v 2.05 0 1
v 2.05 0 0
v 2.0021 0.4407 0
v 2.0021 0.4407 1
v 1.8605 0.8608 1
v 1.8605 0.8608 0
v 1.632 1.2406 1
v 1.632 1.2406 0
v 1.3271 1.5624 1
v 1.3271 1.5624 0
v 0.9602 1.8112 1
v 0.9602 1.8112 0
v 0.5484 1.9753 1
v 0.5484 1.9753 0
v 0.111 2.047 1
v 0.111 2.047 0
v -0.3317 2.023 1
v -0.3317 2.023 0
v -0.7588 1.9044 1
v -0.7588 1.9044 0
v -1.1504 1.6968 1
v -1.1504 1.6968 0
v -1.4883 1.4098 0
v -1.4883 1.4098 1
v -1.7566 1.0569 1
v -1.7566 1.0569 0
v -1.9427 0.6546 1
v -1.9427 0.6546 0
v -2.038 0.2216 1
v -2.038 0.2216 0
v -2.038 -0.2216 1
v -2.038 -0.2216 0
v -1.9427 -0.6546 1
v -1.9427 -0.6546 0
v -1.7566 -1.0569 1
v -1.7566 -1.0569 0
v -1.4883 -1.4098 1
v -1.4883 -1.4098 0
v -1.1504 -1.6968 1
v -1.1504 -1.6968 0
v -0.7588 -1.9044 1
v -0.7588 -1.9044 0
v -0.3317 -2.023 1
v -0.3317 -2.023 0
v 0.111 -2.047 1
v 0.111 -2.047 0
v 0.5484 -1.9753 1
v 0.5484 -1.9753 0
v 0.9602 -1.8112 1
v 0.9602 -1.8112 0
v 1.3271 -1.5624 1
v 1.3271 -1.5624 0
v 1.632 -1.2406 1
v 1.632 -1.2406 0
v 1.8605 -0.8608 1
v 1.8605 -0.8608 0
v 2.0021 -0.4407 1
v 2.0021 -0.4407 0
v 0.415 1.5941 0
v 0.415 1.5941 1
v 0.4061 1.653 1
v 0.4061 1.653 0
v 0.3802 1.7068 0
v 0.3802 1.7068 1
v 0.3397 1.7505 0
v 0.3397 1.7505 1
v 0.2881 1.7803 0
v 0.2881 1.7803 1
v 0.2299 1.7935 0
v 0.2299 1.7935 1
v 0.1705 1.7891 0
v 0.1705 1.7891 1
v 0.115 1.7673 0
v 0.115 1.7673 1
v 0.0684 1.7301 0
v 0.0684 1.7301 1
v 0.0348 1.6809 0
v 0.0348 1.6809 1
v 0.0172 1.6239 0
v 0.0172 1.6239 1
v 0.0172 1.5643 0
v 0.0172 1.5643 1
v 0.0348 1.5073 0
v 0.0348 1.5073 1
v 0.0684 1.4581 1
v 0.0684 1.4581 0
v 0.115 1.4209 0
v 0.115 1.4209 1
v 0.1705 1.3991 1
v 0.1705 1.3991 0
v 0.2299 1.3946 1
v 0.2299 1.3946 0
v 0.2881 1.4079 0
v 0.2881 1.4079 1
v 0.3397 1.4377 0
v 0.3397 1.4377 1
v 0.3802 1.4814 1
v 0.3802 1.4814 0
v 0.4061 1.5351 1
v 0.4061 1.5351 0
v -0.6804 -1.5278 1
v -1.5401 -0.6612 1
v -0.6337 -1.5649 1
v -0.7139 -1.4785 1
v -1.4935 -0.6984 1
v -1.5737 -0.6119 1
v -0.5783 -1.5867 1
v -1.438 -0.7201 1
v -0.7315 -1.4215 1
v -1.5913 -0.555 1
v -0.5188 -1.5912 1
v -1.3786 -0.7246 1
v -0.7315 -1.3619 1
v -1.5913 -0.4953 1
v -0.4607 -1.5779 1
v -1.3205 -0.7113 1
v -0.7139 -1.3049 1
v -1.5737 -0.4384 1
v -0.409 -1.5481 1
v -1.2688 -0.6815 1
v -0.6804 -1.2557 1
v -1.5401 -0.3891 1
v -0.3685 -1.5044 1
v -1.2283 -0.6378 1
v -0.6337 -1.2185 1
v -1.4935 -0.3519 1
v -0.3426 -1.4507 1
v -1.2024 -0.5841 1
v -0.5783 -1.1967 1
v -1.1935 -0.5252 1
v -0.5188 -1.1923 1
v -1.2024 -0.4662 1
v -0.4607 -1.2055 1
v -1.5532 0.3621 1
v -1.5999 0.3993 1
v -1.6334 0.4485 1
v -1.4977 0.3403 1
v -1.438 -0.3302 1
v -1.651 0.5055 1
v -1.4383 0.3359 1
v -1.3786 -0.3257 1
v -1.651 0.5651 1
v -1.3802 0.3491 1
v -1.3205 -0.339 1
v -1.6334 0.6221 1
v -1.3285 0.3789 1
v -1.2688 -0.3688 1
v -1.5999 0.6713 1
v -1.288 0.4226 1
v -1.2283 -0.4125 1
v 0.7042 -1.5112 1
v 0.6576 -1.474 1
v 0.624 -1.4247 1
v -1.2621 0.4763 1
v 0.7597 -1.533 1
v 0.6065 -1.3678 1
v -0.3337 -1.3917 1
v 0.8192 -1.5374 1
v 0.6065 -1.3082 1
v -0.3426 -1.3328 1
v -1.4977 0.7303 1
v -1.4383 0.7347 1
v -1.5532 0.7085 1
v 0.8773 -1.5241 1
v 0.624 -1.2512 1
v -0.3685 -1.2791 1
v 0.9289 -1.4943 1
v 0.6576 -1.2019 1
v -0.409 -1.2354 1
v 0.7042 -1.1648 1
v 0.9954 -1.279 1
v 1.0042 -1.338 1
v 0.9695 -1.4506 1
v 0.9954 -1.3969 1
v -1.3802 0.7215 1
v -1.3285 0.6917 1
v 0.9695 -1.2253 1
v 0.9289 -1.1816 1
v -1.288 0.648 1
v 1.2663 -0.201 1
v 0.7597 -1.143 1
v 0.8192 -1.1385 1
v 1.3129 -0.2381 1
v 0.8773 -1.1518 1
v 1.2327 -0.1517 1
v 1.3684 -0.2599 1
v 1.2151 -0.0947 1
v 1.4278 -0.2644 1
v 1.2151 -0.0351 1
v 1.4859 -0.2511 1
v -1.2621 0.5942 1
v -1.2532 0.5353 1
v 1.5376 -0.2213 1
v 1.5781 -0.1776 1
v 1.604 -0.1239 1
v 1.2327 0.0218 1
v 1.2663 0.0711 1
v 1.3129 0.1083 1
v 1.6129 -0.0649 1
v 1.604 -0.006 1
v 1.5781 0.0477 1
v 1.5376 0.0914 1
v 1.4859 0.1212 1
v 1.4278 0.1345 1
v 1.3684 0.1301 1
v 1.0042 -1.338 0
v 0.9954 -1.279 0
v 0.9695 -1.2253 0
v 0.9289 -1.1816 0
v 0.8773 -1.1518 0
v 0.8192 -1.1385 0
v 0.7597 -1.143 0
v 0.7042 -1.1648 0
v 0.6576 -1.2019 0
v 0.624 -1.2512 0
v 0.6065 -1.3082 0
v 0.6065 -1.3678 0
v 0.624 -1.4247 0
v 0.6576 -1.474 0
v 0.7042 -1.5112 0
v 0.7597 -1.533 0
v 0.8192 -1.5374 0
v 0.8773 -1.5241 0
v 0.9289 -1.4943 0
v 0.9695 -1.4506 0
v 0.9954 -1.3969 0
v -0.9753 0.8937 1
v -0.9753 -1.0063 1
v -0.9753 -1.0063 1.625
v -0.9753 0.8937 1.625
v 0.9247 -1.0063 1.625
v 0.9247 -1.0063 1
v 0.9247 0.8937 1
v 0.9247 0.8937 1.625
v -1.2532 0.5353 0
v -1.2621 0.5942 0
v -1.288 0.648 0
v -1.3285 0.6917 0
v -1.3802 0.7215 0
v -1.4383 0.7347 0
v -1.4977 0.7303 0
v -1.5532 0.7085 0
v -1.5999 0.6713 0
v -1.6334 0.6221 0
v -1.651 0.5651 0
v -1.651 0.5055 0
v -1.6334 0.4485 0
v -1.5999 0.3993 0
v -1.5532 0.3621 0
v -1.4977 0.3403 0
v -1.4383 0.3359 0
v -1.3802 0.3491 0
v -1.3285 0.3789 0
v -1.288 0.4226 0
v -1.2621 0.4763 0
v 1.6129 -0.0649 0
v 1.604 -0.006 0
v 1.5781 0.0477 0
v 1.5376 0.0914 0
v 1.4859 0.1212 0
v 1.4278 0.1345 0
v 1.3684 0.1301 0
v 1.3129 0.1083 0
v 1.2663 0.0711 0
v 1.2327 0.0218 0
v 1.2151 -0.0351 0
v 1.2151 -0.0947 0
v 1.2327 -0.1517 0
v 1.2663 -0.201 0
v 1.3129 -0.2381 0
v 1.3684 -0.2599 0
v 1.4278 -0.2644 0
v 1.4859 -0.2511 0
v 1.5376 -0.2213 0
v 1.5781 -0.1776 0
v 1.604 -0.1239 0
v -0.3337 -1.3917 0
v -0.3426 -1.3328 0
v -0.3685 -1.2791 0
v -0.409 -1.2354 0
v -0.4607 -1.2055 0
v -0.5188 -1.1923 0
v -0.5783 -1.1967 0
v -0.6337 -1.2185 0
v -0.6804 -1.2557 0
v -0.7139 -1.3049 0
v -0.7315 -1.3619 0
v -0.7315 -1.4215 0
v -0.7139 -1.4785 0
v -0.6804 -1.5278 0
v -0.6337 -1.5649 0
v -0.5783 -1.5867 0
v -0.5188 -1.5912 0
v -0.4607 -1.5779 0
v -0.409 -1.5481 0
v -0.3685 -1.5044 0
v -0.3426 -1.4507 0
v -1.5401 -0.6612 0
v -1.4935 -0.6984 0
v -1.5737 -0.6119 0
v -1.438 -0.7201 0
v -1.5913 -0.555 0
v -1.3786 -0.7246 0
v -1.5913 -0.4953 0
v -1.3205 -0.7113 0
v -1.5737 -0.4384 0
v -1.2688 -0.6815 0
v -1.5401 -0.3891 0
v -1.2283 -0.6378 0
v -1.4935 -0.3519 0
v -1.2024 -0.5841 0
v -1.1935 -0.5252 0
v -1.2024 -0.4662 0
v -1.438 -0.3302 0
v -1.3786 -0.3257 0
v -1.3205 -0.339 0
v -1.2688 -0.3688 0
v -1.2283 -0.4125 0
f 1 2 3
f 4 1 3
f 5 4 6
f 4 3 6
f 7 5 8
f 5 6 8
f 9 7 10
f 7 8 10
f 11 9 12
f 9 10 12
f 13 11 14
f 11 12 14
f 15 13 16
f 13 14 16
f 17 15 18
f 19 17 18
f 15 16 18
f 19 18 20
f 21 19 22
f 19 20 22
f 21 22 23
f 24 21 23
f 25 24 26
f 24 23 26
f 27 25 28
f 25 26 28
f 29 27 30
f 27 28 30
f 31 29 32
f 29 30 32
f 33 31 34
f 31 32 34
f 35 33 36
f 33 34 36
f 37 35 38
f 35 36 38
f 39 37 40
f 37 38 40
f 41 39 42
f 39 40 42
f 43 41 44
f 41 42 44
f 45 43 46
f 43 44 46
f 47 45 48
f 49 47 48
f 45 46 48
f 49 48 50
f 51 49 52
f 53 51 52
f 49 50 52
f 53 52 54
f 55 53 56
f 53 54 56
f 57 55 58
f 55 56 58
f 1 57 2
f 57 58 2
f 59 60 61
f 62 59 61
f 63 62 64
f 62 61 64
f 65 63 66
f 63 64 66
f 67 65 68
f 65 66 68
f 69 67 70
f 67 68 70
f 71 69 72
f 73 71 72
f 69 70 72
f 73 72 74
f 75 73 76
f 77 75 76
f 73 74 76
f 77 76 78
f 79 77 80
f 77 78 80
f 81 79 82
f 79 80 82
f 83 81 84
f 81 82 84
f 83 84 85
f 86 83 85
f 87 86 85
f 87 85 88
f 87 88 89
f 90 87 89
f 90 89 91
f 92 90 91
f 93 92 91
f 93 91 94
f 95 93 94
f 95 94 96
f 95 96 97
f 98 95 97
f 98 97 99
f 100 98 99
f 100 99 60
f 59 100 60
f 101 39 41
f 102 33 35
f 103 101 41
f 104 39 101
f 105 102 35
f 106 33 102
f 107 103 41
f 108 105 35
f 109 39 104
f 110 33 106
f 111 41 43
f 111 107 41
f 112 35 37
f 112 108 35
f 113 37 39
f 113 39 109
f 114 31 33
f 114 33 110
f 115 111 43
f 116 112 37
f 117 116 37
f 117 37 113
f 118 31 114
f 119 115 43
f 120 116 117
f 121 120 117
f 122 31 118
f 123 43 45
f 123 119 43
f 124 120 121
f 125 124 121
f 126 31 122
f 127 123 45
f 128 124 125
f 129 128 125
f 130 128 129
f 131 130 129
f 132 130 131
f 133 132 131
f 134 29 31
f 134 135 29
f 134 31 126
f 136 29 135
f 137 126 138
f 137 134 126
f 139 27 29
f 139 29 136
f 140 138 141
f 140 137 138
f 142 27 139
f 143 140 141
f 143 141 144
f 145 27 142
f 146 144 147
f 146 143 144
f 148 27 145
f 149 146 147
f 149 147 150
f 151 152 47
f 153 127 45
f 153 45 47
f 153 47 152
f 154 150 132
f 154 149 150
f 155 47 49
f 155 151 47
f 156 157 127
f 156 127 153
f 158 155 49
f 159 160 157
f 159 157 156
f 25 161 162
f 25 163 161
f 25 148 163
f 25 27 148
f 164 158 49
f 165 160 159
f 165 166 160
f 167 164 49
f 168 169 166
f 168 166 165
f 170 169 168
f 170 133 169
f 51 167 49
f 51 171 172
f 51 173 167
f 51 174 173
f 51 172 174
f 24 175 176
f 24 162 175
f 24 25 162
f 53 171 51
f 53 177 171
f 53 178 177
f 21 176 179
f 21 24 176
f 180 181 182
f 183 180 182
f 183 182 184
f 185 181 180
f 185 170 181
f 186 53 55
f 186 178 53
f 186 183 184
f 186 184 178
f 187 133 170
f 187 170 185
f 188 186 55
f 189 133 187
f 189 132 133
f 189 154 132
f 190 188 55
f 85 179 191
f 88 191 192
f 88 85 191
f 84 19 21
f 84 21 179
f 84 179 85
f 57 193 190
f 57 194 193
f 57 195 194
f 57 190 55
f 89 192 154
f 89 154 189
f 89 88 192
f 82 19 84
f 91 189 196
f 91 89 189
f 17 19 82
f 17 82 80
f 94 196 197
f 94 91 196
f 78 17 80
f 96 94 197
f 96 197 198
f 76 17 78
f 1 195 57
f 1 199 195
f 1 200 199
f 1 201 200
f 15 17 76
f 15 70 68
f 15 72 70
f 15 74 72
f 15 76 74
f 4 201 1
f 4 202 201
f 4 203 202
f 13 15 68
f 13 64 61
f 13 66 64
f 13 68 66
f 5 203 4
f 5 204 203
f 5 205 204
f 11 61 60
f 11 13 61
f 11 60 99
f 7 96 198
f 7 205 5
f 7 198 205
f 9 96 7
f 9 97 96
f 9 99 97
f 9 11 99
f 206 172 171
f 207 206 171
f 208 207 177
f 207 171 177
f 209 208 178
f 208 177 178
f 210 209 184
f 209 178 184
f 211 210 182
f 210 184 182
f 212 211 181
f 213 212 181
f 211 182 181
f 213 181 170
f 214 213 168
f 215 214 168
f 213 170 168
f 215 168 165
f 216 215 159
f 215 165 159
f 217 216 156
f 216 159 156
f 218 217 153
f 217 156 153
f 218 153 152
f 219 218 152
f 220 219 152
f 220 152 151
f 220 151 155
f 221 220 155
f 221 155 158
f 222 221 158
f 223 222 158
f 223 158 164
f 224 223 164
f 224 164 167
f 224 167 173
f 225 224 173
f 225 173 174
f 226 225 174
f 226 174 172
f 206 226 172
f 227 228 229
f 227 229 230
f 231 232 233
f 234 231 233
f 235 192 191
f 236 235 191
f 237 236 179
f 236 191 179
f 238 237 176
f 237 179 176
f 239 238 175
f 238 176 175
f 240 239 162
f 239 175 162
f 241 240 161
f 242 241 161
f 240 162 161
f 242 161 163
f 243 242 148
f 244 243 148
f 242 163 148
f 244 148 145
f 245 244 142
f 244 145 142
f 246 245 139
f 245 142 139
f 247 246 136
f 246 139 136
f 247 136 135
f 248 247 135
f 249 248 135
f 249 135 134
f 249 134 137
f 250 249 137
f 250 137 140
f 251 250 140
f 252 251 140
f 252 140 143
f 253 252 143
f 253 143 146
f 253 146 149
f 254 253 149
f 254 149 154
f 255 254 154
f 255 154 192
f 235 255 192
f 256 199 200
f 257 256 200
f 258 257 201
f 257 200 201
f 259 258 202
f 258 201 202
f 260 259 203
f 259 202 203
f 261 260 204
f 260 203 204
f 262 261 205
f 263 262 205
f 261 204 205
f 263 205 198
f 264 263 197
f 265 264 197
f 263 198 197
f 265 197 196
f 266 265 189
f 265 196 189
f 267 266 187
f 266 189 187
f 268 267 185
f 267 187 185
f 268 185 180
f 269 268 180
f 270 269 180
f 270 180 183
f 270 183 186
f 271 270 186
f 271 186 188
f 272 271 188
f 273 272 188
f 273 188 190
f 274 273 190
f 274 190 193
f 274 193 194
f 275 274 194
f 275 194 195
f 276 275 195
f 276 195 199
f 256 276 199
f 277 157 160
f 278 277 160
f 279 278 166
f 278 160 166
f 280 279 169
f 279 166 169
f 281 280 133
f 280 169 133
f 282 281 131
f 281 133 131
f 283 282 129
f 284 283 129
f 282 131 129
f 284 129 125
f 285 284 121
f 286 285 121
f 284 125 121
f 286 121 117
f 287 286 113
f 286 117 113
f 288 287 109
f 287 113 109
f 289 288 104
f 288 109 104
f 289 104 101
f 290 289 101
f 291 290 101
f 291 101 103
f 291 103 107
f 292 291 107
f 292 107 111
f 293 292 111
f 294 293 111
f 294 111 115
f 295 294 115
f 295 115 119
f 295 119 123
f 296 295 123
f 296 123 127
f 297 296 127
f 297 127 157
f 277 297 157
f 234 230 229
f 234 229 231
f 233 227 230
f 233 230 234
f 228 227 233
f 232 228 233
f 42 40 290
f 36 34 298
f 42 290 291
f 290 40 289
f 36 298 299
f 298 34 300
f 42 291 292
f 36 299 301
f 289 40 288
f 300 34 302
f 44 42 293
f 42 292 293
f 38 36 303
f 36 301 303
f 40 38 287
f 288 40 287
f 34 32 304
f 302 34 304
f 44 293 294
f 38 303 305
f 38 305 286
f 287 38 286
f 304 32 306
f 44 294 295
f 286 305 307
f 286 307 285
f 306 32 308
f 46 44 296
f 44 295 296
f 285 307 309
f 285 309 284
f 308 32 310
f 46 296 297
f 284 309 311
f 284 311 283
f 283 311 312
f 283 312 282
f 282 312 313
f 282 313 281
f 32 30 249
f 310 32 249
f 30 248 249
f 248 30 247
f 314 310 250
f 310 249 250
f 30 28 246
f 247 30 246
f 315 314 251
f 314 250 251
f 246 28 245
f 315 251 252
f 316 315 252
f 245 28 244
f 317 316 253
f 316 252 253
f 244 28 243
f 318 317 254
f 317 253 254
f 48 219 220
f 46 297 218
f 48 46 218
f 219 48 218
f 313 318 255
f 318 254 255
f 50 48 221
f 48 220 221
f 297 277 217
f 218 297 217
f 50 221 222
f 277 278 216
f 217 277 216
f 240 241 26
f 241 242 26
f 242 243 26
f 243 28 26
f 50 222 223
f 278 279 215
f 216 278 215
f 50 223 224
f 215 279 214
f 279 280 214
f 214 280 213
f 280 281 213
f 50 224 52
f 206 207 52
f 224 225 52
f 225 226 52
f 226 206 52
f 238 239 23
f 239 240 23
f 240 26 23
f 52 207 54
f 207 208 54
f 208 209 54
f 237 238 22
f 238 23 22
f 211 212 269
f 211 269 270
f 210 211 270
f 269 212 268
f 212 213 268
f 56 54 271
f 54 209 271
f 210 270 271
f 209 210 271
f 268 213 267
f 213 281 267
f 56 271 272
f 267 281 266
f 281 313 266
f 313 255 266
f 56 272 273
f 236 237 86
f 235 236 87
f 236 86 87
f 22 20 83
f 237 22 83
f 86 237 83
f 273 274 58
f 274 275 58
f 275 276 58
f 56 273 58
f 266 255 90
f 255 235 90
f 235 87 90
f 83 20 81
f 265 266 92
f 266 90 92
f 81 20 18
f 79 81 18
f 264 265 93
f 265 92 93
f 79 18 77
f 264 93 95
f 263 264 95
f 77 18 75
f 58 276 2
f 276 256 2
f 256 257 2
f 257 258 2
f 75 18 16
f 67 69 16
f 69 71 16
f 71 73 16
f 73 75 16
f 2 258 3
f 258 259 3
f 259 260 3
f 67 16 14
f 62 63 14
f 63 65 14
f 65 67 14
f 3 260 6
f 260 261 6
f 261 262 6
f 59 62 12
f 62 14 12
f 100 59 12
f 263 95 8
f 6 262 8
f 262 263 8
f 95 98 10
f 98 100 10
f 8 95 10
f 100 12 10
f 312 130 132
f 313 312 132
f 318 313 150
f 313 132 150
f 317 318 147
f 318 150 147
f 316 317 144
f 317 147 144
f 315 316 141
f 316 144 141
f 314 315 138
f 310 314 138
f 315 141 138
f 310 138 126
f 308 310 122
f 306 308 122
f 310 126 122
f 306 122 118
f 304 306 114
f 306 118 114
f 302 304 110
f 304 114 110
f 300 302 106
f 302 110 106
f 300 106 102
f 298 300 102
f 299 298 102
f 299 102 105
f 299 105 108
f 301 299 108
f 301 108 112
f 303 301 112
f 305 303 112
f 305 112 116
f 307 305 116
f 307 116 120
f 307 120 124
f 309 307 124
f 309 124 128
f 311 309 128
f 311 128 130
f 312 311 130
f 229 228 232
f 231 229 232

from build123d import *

# Parameters (mm, degrees)
F0_R     = 2.05
F1_DEPTH = 1
F2_W     = 1.9
F2_H     = 1.9
F3_DEPTH = 0.625
F4_R     = 0.2
F5_DEPTH = 1.001


# Not quite as in the source:
# - a feature of the source that left no trace in its solid (it failed there, or was rolled back) is left out


with BuildPart() as f1:
    # F0 (on Top) → F1 (new body)
    with BuildSketch(Plane.XY):
        Circle(F0_R)
    extrude(amount=F1_DEPTH)

    # F4 (on face) → F5 (cut, through all)
    with BuildSketch(Plane.XY.offset(1)):
        with Locations((-1.3935204645, -0.5251522966)):
            Circle(F4_R)
        with Locations((-1.4532401648, 0.5352973713)):
            Circle(F4_R)
        with Locations((1.4128740877, -0.0649337453)):
            Circle(F4_R)
        with Locations((0.8042382542, -1.3379652519)):
            Circle(F4_R)
        with Locations((-0.5337471957, -1.3917236356)):
            Circle(F4_R)
        with Locations((0.2150003766, 1.5940891608)):
            Circle(F4_R)
    extrude(amount=-F5_DEPTH, mode=Mode.SUBTRACT)


with BuildPart() as f3:
    # F2 (on face) → F3 (new body)
    with BuildSketch(Plane.XY.offset(1)):
        with Locations((-0.0252776808, -0.0563459136)):
            Rectangle(F2_W, F2_H)
    extrude(amount=F3_DEPTH)


solid = Compound([f1.part, f3.part])
